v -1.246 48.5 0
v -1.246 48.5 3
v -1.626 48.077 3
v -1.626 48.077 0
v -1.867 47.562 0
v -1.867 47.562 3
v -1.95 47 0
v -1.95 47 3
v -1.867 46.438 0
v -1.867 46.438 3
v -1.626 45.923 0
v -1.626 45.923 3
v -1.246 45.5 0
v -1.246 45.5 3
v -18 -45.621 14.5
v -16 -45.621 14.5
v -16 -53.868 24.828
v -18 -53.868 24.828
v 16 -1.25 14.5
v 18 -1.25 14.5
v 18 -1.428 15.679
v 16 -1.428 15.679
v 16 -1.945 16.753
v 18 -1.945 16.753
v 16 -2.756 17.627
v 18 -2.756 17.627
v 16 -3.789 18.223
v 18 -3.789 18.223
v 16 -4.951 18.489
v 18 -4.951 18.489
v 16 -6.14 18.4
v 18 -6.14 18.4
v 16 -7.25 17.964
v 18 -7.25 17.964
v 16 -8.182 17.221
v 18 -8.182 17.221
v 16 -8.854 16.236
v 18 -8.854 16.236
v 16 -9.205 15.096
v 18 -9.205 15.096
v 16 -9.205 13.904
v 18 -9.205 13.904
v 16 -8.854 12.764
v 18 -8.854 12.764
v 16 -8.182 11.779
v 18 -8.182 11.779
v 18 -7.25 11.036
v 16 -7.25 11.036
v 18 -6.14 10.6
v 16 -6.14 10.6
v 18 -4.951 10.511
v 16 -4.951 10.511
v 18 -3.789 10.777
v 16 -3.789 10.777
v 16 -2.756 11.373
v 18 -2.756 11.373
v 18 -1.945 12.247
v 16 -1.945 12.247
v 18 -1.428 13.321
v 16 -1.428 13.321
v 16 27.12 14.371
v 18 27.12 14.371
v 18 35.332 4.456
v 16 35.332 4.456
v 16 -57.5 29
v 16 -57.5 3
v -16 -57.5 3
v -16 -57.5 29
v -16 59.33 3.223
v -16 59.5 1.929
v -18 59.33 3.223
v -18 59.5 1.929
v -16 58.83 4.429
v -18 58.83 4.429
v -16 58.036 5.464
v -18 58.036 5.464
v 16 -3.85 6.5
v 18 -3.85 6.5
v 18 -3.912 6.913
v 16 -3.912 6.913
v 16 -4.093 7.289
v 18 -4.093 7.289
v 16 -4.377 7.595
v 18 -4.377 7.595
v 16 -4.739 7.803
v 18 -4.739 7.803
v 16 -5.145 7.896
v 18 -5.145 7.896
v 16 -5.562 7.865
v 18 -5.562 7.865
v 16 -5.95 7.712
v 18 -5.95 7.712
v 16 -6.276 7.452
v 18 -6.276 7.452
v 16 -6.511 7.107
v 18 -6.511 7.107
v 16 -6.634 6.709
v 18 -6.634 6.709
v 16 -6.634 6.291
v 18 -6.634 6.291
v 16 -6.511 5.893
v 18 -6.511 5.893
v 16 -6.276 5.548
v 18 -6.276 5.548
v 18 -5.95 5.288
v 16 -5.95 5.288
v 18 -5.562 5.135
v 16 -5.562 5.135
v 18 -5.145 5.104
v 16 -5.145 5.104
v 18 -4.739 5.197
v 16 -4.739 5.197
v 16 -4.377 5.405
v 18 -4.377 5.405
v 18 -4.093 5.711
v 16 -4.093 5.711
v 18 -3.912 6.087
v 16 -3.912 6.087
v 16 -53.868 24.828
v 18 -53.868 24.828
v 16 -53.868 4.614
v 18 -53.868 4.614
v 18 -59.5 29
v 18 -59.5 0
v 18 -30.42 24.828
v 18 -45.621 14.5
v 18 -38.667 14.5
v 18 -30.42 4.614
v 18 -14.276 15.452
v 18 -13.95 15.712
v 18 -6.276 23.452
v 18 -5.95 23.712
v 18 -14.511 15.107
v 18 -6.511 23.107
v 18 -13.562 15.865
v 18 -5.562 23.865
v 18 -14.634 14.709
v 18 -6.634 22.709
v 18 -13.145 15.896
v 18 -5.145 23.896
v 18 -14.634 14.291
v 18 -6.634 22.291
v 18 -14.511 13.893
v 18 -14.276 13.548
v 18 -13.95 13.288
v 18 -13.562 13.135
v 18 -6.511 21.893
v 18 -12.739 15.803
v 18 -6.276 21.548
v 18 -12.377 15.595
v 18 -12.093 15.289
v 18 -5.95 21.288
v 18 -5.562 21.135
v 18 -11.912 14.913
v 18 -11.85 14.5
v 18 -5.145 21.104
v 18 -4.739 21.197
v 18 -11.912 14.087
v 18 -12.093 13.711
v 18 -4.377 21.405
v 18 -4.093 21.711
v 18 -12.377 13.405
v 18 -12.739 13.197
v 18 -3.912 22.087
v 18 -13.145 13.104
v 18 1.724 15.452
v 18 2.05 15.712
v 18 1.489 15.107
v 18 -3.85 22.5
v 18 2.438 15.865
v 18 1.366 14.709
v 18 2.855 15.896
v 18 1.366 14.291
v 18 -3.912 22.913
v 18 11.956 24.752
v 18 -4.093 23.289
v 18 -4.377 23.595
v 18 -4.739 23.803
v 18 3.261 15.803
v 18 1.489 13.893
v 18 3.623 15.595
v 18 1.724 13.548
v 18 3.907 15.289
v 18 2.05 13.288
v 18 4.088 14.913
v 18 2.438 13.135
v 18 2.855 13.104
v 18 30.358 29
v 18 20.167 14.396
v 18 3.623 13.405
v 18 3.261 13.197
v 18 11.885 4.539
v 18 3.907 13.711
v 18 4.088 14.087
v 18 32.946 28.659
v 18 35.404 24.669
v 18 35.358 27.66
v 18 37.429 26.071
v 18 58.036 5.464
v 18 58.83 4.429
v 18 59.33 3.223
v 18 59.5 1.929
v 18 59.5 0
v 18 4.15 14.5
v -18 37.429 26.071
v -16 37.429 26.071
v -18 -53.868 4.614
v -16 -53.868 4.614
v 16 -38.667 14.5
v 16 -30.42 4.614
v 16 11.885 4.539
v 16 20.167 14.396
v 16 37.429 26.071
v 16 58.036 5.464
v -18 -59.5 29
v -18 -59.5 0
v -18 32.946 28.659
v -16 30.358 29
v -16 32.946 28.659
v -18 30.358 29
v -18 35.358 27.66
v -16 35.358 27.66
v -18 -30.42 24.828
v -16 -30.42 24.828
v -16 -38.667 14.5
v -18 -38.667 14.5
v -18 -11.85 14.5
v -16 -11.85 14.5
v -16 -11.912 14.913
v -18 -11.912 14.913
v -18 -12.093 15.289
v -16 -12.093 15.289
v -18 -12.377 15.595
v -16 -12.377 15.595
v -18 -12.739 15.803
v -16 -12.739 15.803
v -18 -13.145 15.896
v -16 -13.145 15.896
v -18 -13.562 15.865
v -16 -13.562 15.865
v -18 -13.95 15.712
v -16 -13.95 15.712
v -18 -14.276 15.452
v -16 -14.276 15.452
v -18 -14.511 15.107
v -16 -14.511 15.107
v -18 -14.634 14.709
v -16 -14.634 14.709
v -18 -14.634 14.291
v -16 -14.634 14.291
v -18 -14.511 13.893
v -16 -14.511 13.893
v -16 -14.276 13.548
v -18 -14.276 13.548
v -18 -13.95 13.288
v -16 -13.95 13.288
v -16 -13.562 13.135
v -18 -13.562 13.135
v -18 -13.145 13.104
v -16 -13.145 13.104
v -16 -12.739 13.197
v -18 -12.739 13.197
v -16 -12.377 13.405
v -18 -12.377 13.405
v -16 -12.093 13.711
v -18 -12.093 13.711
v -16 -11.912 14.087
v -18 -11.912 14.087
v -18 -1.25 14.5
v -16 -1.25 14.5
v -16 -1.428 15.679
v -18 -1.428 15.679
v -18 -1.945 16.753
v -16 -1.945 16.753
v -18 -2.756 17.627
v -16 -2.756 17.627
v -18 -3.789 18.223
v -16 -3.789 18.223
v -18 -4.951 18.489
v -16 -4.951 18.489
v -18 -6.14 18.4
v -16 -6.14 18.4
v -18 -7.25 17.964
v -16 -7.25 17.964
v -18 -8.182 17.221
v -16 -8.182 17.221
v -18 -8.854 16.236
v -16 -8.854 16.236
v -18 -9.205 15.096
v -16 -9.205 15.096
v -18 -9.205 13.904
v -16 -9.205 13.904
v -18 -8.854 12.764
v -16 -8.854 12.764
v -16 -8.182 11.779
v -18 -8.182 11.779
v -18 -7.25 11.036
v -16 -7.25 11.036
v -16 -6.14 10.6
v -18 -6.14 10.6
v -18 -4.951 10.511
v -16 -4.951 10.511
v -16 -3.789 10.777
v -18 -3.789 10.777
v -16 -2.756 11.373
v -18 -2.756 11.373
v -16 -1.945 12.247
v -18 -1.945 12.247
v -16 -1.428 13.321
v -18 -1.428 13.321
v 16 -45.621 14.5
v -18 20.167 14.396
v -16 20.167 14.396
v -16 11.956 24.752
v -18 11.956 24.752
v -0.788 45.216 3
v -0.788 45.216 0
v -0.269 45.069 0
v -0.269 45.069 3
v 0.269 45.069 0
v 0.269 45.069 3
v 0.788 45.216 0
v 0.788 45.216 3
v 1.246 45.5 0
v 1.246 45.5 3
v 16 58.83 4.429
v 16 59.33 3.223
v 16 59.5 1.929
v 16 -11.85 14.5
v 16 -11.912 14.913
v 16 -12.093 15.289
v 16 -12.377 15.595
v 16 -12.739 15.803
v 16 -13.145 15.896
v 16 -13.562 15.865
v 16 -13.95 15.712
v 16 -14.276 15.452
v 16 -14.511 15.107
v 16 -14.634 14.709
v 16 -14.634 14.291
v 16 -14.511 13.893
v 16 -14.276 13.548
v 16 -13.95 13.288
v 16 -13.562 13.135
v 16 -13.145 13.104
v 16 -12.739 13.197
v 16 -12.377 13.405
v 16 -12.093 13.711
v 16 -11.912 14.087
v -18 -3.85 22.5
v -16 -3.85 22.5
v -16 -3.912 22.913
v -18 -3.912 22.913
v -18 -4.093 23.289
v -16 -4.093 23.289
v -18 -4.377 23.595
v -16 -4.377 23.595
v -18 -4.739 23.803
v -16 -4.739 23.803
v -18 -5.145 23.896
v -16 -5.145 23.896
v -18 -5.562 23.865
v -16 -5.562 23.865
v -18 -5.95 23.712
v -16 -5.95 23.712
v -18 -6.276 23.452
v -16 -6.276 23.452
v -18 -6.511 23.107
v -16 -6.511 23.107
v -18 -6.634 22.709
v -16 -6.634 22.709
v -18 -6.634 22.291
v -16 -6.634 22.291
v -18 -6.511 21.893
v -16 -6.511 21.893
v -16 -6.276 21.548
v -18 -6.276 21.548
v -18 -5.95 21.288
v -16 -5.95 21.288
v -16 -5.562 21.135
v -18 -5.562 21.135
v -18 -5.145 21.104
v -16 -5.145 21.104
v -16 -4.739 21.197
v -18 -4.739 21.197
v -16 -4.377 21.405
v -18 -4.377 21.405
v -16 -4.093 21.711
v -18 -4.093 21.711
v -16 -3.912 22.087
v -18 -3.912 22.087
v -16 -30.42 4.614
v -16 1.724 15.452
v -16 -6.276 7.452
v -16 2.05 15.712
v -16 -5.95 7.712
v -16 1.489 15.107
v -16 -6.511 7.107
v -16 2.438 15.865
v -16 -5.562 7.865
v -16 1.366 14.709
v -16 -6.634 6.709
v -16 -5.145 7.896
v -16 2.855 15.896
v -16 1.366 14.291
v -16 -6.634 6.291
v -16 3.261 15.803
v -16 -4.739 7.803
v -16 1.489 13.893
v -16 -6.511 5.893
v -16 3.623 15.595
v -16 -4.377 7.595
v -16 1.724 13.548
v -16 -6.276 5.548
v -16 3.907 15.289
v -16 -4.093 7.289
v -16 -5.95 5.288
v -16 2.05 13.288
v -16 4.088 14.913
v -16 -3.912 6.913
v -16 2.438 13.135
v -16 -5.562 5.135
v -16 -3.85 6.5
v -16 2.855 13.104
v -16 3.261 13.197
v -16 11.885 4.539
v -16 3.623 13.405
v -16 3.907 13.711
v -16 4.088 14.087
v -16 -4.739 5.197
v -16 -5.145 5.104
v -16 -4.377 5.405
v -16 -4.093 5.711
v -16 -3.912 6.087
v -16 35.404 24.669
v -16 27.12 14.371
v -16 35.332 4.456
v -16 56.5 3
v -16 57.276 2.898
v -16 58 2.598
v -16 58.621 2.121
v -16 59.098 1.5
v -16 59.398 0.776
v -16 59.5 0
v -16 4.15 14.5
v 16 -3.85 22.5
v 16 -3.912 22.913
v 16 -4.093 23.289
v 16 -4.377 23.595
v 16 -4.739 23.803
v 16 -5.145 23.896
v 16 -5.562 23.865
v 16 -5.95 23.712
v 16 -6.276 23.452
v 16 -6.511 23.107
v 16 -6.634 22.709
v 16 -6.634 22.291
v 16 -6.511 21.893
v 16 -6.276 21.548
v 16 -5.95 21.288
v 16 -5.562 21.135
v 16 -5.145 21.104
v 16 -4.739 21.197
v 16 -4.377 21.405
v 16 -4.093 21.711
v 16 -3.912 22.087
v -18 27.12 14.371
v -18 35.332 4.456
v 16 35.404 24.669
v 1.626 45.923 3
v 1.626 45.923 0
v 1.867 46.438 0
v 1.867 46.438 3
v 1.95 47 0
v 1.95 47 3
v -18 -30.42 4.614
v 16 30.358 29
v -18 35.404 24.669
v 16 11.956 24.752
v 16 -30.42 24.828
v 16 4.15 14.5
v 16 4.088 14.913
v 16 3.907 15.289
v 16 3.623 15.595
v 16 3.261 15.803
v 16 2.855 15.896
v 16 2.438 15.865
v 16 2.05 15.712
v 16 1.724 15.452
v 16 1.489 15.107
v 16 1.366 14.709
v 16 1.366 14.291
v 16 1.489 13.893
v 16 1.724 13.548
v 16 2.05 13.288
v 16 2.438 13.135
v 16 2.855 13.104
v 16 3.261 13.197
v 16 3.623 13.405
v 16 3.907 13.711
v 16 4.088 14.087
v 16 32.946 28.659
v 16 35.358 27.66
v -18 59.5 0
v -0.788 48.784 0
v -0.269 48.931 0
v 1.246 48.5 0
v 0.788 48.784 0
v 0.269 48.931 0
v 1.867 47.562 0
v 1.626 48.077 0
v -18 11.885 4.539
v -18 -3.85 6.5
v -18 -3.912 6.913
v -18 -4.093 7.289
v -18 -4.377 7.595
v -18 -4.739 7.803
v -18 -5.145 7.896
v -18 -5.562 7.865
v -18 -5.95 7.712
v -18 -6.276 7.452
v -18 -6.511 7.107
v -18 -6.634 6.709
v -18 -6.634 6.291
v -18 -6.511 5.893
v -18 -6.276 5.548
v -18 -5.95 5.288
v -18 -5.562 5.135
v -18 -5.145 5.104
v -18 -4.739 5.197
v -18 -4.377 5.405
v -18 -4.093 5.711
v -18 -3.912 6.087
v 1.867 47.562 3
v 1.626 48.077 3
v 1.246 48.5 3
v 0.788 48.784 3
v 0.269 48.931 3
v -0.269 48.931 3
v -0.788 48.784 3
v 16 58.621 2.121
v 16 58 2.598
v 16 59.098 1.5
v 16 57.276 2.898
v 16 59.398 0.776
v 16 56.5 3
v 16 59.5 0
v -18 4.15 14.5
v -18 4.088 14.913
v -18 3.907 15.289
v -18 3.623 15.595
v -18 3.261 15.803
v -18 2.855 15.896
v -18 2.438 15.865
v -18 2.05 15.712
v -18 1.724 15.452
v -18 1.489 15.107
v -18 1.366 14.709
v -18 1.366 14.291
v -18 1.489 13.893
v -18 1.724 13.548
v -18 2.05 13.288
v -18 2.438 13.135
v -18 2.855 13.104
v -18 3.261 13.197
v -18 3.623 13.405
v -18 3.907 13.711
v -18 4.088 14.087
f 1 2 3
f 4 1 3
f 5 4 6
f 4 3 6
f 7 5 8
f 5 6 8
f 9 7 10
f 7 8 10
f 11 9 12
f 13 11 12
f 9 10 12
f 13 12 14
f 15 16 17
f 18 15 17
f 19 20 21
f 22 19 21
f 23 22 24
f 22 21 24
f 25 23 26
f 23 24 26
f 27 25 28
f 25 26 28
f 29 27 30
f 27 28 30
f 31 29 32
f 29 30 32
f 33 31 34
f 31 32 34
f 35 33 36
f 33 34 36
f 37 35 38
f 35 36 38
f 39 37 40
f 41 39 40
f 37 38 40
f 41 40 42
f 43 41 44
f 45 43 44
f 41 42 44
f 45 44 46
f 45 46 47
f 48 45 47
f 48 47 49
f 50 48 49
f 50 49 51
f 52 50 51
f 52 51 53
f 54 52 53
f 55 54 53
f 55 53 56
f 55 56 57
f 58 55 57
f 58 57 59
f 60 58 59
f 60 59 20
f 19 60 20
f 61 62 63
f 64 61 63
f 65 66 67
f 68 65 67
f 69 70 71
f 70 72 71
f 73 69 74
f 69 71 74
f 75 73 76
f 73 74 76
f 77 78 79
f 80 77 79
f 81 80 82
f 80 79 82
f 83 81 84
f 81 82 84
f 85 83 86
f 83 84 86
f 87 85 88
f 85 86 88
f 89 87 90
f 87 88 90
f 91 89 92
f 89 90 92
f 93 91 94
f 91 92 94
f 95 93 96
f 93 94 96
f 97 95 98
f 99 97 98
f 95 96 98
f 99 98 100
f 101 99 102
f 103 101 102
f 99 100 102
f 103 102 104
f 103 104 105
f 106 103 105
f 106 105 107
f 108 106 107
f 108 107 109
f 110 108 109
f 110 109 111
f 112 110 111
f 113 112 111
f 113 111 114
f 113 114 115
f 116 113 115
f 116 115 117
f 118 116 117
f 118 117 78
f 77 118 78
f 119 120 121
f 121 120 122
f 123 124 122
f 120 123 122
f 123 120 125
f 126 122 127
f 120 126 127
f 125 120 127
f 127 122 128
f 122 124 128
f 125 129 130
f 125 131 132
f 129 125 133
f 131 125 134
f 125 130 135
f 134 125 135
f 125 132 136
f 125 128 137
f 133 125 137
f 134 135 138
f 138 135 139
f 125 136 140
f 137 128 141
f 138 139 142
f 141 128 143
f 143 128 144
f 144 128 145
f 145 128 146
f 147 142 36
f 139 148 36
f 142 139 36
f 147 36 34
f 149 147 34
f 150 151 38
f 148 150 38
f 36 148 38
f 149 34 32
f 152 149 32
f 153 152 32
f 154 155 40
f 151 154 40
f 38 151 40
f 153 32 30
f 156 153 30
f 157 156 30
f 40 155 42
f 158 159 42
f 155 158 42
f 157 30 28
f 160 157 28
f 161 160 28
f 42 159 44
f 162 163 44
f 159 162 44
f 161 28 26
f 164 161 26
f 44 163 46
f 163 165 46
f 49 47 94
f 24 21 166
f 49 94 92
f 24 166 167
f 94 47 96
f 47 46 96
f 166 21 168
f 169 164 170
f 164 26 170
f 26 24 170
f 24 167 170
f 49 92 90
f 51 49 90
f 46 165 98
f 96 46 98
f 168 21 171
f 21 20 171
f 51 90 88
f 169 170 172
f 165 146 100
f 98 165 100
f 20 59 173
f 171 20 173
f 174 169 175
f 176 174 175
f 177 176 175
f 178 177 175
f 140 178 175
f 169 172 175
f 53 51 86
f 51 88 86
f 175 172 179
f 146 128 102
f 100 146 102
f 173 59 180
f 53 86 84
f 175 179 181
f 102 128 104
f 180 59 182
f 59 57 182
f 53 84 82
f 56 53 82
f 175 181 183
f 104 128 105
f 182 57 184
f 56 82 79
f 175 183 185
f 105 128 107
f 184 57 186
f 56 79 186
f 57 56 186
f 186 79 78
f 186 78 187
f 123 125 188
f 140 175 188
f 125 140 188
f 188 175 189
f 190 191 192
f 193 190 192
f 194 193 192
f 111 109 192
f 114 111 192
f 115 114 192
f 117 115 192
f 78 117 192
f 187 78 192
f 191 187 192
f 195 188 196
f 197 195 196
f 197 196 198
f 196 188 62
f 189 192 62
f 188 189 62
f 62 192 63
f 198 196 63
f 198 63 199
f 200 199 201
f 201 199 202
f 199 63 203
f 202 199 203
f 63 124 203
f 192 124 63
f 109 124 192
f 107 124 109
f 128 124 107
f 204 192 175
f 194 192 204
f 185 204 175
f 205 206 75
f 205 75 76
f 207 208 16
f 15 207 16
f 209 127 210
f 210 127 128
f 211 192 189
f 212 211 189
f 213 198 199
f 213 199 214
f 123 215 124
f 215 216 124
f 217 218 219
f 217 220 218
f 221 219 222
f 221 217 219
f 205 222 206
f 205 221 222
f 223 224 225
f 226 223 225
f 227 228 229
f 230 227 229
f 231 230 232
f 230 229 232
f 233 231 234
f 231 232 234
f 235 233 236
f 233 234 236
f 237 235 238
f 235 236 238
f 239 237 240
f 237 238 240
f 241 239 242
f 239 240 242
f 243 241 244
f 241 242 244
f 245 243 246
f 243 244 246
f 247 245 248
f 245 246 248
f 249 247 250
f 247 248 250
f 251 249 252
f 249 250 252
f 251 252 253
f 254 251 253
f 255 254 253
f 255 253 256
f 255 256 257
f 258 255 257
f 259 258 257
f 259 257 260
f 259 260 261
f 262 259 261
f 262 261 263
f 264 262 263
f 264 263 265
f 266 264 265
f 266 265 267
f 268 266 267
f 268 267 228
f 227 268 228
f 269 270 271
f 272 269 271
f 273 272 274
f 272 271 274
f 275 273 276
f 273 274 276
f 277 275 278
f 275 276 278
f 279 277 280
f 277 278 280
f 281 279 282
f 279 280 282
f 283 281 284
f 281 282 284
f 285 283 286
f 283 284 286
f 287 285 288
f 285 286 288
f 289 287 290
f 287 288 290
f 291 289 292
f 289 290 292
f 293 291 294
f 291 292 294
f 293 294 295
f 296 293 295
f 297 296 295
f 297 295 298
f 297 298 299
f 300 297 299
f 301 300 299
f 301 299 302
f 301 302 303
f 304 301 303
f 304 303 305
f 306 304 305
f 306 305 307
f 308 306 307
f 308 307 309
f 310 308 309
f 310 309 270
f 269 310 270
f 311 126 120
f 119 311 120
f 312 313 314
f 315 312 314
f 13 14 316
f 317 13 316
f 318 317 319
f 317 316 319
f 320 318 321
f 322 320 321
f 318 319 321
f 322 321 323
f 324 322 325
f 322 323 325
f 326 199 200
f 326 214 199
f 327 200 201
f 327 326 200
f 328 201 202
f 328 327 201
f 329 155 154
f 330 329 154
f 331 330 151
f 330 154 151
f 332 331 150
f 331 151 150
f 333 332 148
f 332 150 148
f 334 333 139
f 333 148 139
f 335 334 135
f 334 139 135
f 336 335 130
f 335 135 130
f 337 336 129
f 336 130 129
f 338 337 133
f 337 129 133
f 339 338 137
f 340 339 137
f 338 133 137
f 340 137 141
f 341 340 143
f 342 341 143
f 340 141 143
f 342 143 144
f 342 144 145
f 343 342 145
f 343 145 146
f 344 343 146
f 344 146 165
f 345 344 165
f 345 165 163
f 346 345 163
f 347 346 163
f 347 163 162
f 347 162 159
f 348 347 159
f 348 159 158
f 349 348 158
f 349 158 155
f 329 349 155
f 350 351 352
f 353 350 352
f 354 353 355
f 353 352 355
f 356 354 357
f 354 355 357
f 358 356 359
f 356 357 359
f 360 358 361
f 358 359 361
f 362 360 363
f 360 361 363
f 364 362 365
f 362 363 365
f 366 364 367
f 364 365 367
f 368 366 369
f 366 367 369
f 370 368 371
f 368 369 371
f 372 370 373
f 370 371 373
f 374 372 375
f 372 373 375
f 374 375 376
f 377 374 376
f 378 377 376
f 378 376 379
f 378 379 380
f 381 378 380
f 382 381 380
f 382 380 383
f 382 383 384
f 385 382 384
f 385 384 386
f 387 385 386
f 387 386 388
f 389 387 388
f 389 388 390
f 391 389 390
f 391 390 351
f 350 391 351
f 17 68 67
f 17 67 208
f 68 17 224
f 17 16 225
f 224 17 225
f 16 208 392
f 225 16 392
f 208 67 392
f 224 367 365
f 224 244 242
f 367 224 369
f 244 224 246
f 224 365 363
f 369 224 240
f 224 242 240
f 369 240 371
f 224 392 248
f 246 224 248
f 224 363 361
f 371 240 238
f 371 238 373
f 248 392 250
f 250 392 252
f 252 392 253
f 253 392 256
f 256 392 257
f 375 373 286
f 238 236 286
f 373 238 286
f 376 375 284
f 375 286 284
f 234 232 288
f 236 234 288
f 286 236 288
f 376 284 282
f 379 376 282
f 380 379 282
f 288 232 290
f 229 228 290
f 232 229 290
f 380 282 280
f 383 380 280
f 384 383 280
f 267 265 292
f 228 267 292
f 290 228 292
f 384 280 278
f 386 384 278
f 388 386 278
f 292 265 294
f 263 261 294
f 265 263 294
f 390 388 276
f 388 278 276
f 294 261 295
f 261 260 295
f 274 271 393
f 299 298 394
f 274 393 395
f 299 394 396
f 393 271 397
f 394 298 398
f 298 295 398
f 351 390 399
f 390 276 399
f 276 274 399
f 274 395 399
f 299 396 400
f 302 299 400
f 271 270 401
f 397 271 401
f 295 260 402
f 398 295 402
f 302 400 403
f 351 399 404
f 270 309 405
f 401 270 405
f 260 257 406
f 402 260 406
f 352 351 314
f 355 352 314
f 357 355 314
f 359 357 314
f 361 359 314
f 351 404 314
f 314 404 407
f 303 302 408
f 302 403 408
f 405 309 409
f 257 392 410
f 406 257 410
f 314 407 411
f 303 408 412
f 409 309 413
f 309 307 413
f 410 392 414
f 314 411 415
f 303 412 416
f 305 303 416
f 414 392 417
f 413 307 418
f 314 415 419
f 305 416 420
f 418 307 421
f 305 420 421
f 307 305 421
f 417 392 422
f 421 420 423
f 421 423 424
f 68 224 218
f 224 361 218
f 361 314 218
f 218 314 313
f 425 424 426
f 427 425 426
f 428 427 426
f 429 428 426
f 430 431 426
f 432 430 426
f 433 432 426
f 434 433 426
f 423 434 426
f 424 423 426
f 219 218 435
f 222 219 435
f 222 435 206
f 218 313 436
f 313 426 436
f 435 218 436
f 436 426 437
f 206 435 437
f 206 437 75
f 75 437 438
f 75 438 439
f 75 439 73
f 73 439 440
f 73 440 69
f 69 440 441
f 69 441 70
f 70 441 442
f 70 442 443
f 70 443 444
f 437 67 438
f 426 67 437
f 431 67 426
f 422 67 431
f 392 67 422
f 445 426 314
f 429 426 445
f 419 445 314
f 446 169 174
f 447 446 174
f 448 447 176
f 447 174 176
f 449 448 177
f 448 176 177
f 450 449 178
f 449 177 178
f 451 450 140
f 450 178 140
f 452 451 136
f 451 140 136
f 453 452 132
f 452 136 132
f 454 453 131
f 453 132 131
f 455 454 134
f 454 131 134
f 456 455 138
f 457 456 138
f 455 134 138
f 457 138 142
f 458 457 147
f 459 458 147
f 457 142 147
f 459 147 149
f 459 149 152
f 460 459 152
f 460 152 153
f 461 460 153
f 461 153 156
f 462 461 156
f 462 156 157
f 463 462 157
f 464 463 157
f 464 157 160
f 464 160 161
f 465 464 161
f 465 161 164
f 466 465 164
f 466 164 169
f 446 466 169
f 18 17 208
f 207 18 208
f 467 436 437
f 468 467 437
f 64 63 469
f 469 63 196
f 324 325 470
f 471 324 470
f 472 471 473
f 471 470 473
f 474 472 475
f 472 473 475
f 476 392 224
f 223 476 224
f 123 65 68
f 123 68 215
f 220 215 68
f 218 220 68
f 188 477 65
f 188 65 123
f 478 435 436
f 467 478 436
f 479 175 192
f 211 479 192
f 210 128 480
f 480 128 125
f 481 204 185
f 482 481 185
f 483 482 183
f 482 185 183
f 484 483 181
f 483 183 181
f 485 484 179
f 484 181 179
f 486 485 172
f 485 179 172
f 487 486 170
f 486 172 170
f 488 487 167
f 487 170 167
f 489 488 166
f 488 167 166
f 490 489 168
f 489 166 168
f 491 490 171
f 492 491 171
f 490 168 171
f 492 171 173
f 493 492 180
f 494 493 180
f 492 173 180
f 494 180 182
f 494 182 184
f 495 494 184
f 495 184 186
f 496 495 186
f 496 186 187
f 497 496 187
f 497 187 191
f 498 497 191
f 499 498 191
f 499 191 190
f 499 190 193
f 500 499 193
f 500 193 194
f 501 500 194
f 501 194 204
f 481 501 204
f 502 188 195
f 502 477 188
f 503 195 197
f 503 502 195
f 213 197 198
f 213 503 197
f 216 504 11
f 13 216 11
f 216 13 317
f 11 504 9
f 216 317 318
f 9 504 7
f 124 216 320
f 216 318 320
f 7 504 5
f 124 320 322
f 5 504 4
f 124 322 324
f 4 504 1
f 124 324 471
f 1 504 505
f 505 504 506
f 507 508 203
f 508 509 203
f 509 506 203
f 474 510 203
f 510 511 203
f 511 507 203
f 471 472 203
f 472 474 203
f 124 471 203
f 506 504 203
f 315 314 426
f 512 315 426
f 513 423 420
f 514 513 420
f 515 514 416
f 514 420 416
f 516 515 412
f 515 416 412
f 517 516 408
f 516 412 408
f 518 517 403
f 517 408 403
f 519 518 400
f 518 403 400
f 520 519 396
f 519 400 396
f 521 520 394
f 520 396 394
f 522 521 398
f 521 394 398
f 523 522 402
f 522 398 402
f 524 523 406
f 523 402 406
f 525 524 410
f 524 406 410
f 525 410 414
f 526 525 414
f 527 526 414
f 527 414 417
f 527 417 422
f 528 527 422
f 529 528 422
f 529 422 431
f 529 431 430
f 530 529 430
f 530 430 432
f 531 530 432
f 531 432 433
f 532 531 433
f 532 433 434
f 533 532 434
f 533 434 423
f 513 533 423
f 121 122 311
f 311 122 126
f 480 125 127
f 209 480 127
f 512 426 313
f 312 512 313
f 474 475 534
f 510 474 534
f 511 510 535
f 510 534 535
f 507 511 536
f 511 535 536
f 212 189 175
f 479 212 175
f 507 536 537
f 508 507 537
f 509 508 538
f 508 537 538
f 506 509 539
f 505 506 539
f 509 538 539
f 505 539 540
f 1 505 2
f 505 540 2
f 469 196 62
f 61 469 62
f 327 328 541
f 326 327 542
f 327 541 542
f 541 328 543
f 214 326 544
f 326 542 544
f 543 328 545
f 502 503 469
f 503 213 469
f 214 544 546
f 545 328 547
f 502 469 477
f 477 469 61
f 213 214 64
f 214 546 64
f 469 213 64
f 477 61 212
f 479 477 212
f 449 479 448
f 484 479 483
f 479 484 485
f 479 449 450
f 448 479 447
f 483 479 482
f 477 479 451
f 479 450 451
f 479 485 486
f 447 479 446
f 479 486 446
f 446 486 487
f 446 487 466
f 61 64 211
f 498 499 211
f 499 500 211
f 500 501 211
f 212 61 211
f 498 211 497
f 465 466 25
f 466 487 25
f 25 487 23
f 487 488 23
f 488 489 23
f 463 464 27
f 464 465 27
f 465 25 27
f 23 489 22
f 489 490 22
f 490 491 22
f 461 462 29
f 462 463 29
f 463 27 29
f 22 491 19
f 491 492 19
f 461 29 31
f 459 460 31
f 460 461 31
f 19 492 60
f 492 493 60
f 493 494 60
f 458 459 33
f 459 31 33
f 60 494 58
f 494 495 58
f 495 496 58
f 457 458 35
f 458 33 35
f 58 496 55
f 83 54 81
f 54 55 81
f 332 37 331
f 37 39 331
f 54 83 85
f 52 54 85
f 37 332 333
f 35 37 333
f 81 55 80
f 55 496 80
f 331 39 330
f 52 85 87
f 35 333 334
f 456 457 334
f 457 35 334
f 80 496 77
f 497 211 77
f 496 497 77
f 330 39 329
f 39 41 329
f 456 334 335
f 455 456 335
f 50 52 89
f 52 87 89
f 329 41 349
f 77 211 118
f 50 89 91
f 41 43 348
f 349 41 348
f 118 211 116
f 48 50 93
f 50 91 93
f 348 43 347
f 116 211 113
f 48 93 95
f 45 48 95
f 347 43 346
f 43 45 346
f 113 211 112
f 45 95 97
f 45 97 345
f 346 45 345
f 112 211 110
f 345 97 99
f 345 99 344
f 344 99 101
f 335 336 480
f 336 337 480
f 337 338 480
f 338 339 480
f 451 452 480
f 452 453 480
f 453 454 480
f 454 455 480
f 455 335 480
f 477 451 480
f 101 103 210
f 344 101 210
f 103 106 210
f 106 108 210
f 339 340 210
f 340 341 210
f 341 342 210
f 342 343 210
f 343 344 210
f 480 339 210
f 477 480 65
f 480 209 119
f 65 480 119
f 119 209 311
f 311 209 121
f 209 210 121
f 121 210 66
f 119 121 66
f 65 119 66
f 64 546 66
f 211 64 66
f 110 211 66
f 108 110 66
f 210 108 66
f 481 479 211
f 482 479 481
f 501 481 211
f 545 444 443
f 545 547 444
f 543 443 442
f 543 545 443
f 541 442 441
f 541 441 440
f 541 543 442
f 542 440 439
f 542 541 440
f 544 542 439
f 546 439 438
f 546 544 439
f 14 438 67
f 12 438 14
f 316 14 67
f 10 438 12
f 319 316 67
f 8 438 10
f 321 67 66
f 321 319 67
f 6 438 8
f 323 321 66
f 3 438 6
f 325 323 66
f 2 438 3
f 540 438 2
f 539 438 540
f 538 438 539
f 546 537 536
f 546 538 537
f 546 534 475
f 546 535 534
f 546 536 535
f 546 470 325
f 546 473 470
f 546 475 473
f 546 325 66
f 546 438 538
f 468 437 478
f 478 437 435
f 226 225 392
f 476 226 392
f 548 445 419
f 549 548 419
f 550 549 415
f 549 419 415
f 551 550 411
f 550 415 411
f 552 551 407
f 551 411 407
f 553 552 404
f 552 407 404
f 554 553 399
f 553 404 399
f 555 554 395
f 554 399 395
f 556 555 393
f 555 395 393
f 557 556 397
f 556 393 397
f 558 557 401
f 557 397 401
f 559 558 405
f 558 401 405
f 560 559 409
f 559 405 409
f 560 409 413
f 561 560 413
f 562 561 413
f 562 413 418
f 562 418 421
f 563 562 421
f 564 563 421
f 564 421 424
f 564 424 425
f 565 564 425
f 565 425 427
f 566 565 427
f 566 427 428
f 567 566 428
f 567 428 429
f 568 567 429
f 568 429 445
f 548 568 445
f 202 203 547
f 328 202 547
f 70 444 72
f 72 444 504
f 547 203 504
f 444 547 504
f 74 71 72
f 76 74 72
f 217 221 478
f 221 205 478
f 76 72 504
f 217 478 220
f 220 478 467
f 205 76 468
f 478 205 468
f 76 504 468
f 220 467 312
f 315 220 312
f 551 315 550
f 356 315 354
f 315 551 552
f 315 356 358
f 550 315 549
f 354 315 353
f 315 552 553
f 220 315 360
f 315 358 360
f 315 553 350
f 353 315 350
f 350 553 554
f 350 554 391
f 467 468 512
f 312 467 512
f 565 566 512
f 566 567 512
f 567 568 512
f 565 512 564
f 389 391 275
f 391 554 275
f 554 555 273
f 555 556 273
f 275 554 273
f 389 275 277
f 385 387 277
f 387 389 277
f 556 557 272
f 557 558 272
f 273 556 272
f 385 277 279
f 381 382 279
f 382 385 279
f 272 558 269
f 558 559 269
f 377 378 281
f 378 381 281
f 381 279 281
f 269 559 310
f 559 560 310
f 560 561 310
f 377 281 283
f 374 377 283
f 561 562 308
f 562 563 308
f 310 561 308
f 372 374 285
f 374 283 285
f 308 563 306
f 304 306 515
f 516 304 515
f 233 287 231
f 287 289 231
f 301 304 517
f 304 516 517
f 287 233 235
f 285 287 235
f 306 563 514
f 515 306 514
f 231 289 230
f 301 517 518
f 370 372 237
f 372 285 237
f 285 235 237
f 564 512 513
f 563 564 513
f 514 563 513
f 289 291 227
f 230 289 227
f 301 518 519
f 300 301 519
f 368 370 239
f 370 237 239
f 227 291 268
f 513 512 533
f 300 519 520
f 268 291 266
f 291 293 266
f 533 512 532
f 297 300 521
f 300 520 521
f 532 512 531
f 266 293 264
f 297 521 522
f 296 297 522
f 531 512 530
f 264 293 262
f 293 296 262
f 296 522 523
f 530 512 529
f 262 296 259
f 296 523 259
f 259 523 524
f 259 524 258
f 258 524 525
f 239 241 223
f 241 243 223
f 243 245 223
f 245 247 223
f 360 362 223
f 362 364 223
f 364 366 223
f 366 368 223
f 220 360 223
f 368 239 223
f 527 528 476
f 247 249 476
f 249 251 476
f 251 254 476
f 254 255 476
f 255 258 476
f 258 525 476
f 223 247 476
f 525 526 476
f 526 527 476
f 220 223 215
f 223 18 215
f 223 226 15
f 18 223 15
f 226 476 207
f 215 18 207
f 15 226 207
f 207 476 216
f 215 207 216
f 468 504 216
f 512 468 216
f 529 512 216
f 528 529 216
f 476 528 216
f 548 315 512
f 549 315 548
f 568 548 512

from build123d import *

# Parameters (mm, degrees)
F0_W      = 36
F0_H      = 119
F1_DEPTH  = 3
F3_DEPTH  = 26
F5_SIZE   = 25
F6_R      = 10
F7_R      = 2.99999
F8_R      = 5
F10_DEPTH = 25
F9_R      = 1.4
F9_R_2    = 4
F11_DEPTH = 36.001


# Not quite as in the source:
# - a fillet or chamfer is up to 0.001 mm smaller than in the source, because OpenCascade refuses the exact size


with BuildPart() as f1:
    # F0 (on Top) → F1 (new body)
    with BuildSketch(Plane.XY):
        Rectangle(F0_W, F0_H)
    extrude(amount=F1_DEPTH)

    # F2 (on face) → F3 (join)
    with BuildSketch(Plane.XY.offset(3)):
        Polygon((16, -57.5), (-16, -57.5), (-16, 57.5), (-16, 59.5), (-18, 59.5), (-18, -59.5), (18, -59.5), (18, 59.5), (16, 59.5), (16, 57.5), align=None)
    extrude(amount=F3_DEPTH)

    # F5
    f5_edges = [f1.edges().sort_by_distance(p)[0] for p in [
        (-17, 59.5, 29),
        (17, 59.5, 29),
    ]]
    chamfer(f5_edges, length=F5_SIZE)

    # F6
    f6_edges = [f1.edges().sort_by_distance(p)[0] for p in [
        (17, 34.5, 29),
        (-17, 34.5, 29),
    ]]
    fillet(f6_edges, radius=F6_R)

    # F7 (radius 3 in the source; OpenCascade refuses exactly that, so slightly less here)
    f7_edges = [f1.edges().sort_by_distance(p)[0] for p in [
        (0, 59.5, 3),
    ]]
    fillet(f7_edges, radius=F7_R)

    # F8
    f8_edges = [f1.edges().sort_by_distance(p)[0] for p in [
        (17, 59.5, 4),
        (-17, 59.5, 4),
    ]]
    fillet(f8_edges, radius=F8_R)

    # F4 (on face) → F10 (cut)
    with BuildSketch(Plane.XY.offset(3)):
        with BuildLine():
            ThreePointArc((-1.2459935794, 48.5), (-1.95, 47), (-1.2459935794, 45.5))
            ThreePointArc((-1.2459935794, 45.5), (0, 45.05), (1.2459935794, 45.5))
            ThreePointArc((1.2459935794, 45.5), (1.7652460848, 46.1715036149), (1.95, 47))
            ThreePointArc((1.95, 47), (1.7652460848, 47.8284963851), (1.2459935794, 48.5))
            ThreePointArc((1.2459935794, 48.5), (0, 48.95), (-1.2459935794, 48.5))
        make_face()
    extrude(amount=-F10_DEPTH, mode=Mode.SUBTRACT)

    # F9 (on face) → F11 (cut, through all)
    with BuildSketch(Plane.YZ.offset(18)):
        with Locations((-5.25, 22.5)):
            Circle(F9_R)
        with Locations((2.75, 14.5)):
            Circle(F9_R)
        with Locations((-5.25, 14.5)):
            Circle(F9_R_2)
        with Locations((-5.25, 6.5)):
            Circle(F9_R)
        with Locations((-13.25, 14.5)):
            Circle(F9_R)
        Polygon((-45.6205420196, 14.5), (-53.8677945733, 24.8276256025), (-53.8677945733, 4.6137683094), align=None)
        Polygon((-30.4197221994, 24.8276256025), (-38.6669747531, 14.5), (-30.4197221994, 4.6137683094), align=None)
        Polygon((11.8845089816, 4.5387393932), (20.1667771096, 14.395655056), (11.9562095653, 24.7524695214), align=None)
        Polygon((35.4041344278, 24.6692968517), (27.1203006313, 14.3709900539), (35.3324338441, 4.4555667236), align=None)
    extrude(amount=-F11_DEPTH, mode=Mode.SUBTRACT)


solid = f1.part
